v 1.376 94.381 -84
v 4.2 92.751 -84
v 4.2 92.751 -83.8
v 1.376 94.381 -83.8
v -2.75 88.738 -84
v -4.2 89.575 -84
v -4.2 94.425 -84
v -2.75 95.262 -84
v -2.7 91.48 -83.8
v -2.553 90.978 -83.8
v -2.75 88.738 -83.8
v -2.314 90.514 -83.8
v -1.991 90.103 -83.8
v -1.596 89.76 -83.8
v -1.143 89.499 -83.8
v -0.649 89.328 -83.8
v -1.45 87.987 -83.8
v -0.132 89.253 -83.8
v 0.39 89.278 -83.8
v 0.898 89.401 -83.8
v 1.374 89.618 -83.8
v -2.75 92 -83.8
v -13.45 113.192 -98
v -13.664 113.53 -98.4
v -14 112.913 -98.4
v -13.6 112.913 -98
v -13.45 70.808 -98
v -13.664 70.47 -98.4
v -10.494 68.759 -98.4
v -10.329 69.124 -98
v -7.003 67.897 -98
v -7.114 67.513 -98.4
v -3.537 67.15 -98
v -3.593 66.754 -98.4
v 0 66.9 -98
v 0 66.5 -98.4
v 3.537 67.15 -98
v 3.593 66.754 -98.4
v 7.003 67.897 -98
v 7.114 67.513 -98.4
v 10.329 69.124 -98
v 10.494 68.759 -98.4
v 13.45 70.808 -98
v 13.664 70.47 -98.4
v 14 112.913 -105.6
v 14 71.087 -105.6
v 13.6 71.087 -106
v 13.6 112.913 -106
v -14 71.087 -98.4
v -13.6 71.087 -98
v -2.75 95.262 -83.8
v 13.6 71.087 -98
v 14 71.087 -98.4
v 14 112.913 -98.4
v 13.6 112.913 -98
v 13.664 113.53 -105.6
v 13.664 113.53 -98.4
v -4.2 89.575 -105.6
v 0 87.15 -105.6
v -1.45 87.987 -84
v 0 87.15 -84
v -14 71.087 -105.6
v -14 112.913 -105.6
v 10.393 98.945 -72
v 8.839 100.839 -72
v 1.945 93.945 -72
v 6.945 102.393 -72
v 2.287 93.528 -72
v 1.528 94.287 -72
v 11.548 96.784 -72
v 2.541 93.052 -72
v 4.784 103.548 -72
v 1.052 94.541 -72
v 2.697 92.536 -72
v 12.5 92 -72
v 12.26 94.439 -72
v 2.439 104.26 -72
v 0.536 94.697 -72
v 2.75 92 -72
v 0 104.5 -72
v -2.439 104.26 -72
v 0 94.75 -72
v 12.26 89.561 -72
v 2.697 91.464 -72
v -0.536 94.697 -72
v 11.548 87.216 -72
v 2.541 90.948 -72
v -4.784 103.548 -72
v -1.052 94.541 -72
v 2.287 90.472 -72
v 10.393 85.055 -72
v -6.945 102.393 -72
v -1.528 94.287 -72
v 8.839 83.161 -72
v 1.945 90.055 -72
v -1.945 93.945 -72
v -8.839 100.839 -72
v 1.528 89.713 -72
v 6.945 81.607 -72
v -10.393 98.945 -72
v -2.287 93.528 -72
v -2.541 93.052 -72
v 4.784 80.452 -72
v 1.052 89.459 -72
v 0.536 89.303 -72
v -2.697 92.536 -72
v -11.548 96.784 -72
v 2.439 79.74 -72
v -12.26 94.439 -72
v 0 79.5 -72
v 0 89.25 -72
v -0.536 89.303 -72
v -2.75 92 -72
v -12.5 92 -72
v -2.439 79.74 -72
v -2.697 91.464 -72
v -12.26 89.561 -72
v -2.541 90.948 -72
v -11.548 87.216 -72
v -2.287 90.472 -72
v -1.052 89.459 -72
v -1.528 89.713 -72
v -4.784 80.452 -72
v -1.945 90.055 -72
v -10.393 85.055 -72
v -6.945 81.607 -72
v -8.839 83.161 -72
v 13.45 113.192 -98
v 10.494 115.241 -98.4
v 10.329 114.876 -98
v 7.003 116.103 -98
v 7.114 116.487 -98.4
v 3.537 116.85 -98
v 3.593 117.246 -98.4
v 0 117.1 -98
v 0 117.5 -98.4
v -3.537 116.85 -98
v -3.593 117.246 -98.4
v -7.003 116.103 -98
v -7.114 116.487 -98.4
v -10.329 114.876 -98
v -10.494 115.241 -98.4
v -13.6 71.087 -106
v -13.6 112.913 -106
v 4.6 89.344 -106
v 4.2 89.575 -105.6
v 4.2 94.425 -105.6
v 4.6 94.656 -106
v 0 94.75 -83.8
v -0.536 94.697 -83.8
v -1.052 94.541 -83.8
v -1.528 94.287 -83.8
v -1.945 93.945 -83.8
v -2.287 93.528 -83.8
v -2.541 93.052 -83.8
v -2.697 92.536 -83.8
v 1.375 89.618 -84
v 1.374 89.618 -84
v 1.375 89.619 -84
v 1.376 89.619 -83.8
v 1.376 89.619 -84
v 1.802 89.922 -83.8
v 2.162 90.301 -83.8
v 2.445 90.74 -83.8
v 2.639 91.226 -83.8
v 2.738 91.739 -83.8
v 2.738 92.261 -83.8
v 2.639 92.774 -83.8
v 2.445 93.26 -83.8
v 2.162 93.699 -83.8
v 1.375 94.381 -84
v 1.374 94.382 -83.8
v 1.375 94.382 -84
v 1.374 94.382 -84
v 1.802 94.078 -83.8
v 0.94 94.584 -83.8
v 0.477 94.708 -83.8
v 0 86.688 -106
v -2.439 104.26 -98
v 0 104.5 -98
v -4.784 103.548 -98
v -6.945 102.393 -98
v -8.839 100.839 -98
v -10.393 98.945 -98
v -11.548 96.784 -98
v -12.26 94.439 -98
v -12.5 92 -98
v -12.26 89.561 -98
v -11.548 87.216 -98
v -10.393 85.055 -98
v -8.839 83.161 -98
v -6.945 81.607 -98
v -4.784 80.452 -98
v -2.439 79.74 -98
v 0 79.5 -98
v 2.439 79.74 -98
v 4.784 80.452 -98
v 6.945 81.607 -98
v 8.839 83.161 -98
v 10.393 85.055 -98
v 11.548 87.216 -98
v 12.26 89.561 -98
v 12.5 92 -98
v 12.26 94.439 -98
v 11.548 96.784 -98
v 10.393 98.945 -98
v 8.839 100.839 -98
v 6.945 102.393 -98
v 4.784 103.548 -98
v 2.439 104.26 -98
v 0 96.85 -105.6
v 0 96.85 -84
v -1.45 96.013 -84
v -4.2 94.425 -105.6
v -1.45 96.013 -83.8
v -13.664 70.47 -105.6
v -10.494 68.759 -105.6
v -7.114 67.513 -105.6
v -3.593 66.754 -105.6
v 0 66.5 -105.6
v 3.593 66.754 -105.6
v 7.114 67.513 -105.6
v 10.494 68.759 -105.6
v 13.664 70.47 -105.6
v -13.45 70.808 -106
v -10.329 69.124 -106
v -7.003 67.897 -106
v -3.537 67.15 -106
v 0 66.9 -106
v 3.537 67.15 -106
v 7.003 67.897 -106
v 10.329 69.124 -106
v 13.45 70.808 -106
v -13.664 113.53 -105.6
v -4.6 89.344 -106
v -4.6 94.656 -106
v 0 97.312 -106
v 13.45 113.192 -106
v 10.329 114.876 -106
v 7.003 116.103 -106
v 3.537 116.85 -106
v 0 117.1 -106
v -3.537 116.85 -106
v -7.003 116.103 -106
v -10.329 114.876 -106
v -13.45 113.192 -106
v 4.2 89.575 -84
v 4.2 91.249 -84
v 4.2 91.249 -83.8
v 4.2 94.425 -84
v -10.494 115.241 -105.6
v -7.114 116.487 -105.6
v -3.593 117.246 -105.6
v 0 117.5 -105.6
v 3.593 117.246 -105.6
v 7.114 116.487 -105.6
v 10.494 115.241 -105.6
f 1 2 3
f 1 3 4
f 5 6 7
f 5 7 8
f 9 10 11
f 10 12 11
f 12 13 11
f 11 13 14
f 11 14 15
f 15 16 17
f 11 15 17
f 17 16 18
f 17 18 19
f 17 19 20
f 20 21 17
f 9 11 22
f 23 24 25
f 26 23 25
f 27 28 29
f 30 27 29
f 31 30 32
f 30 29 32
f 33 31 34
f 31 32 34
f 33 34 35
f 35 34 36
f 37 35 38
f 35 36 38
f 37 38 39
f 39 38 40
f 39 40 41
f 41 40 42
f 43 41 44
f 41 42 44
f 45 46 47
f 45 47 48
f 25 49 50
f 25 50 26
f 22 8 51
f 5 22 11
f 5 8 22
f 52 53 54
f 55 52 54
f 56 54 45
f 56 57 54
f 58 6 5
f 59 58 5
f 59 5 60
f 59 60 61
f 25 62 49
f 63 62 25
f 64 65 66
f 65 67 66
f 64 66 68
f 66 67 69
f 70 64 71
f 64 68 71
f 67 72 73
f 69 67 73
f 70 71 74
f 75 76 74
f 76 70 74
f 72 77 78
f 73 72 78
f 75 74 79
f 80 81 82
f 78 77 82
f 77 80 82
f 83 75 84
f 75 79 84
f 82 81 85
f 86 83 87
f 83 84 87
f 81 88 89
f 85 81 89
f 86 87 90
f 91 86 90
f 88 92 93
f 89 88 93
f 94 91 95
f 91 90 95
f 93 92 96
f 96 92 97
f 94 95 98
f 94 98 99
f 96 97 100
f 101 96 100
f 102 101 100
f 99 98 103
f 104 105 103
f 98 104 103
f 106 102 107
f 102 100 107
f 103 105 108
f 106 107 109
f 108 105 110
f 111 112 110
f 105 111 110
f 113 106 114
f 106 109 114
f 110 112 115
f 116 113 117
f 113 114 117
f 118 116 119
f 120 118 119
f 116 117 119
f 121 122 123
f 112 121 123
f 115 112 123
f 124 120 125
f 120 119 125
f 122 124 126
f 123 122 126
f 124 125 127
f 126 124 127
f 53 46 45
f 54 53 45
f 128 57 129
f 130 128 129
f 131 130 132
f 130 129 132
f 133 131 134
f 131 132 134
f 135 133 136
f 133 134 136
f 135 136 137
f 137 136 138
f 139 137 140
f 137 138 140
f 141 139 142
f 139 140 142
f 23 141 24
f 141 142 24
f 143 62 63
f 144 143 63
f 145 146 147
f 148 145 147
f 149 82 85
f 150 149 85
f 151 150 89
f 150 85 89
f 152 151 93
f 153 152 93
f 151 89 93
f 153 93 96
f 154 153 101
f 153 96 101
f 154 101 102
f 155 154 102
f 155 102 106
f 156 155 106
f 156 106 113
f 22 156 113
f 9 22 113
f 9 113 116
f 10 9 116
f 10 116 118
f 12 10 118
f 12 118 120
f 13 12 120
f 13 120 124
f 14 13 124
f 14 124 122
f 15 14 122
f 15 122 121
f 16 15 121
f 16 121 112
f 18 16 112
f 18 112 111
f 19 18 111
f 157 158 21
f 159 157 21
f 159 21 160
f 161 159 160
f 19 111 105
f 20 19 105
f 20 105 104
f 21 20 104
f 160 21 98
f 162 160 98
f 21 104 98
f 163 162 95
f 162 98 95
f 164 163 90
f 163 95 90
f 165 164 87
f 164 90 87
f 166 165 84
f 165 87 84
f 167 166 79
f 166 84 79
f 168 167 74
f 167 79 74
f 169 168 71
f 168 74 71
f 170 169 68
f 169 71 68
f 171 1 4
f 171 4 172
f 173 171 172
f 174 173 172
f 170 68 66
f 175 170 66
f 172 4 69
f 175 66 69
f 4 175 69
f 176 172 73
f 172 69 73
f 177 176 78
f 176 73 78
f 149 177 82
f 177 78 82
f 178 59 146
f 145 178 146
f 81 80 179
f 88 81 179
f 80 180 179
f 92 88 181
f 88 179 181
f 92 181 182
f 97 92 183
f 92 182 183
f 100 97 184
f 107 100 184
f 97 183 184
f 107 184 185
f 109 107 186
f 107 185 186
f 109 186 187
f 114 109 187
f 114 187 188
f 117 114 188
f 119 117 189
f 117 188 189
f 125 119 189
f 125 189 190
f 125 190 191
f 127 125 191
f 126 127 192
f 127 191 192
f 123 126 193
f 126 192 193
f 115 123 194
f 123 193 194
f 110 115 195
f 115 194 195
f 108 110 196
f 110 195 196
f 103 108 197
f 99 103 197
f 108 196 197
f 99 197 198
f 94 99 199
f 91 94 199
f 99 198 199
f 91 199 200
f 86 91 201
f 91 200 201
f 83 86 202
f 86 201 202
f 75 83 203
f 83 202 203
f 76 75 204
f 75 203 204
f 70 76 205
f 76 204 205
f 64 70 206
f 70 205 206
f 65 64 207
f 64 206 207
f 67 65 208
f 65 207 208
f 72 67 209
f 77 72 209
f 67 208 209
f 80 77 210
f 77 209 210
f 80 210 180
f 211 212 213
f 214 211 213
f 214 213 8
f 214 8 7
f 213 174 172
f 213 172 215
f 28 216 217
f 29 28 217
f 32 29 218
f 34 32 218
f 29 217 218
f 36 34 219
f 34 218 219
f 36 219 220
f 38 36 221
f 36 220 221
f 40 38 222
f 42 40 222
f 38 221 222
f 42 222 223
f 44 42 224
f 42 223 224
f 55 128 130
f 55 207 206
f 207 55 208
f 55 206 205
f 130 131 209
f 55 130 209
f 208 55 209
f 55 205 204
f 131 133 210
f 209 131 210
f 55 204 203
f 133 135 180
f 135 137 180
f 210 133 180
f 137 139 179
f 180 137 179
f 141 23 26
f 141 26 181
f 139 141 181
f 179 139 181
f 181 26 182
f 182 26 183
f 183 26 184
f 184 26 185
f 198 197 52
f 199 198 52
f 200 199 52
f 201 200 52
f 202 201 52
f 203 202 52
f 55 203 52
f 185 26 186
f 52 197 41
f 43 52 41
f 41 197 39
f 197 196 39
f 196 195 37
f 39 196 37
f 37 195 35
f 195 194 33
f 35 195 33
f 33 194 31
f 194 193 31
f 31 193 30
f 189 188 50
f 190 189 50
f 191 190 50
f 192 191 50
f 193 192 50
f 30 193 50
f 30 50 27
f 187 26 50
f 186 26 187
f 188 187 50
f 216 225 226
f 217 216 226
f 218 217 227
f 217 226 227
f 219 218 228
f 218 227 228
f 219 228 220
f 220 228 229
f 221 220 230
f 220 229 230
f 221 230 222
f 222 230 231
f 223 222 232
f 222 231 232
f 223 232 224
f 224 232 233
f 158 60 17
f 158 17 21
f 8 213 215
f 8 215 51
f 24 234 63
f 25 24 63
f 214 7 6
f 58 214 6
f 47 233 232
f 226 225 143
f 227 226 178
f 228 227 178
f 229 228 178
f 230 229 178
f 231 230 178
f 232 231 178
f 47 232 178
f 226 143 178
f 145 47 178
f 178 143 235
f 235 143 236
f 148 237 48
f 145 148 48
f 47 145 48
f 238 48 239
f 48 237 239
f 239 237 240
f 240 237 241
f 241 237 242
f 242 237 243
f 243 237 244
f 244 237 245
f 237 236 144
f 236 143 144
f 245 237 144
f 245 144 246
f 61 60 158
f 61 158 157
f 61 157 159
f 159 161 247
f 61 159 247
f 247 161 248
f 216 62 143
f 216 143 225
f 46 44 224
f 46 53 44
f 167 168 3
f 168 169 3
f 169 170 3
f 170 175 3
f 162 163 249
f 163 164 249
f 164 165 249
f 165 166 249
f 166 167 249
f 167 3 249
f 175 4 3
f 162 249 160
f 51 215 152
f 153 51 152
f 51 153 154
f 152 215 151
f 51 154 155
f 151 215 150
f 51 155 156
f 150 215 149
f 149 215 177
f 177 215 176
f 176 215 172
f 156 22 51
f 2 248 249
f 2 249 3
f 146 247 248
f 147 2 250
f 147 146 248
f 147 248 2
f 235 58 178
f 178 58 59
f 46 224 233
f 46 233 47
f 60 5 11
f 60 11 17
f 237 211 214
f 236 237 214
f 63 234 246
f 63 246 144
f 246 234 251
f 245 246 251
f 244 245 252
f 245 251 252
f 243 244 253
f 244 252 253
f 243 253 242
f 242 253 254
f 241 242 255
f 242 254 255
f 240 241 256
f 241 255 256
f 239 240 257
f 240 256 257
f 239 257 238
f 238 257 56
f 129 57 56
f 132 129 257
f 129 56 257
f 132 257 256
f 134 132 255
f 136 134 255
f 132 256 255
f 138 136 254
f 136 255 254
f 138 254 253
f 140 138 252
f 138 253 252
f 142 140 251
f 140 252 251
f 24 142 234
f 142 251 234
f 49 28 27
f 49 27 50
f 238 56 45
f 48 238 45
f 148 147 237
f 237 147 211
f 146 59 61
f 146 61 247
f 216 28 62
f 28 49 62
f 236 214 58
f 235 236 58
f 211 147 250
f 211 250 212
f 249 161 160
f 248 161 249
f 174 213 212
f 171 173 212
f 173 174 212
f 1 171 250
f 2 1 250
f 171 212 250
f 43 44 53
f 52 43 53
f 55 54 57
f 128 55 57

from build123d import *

# Parameters (mm, degrees)
SKETCH151_W     = 65
SKETCH151_H     = 65
SKETCH151_W_2   = 53.065996
SKETCH151_H_2   = 28
POCKET099_DEPTH = 34.001
POCKET100_DEPTH = 22.001
POCKET_DEPTH    = 0.2
CHAMFER_SIZE    = 0.4


with BuildPart() as part:
    # Sketch103 → Revolution002 (revolve)
    with BuildSketch(Plane.YZ):
        Polygon((2.75, 0), (12.5, 0), (12.5, -26), (25.5, -26), (25.5, -34), (2.75, -34), align=None)
    revolve(axis=Axis((0, 0, 0), (0, 0, 1)))

    # Sketch151 (on Face5 of Revolution002) → Pocket099 (cut, through all)
    with BuildSketch(Plane.YX.offset(34)):
        Rectangle(SKETCH151_W, SKETCH151_H)
        Rectangle(SKETCH151_W_2, SKETCH151_H_2, mode=Mode.SUBTRACT)
    extrude(amount=-POCKET099_DEPTH, mode=Mode.SUBTRACT)

    # Sketch142 → Pocket100 (cut, through all)
    with BuildSketch(Plane.XY.offset(-12)):
        Polygon((4.2, 2.424871), (0, 4.849742), (-4.2, 2.424871), (-4.2, -2.424871), (0, -4.849742), (4.2, -2.424871), align=None)
    extrude(amount=-POCKET100_DEPTH, mode=Mode.SUBTRACT)

    # Sketch (on Face4 of Pocket100) → Pocket (cut)
    with BuildSketch(Plane.YX.offset(12)):
        Polygon((0.750555, 4.2), (4.012584, -1.45), (3.262029, -2.75), (-3.262029, -2.75), (-4.012584, -1.45), (-0.750555, 4.2), align=None)
    extrude(amount=-POCKET_DEPTH, mode=Mode.SUBTRACT)

    # Chamfer
    chamfer_edges = [part.edges().sort_by_distance(p)[0] for p in [
        (-7.306329, 24.430873, -34),
        (-14, 0, -34),
        (7.306329, 24.430873, -34),
        (0, -25.5, -34),
        (14, 0, -34),
        (2.1, 3.637307, -34),
        (4.2, 0, -34),
        (2.1, -3.637307, -34),
        (-2.1, -3.637307, -34),
        (-4.2, 0, -34),
        (-2.1, 3.637307, -34),
        (0, -25.5, -26),
        (14, 0, -26),
        (7.306329, 24.430873, -26),
        (-7.306329, 24.430873, -26),
        (-14, 0, -26),
        (14, -21.313141, -30),
        (14, 21.313141, -30),
        (-14, 21.313141, -30),
        (-14, -21.313141, -30),
    ]]
    chamfer(chamfer_edges, length=CHAMFER_SIZE)


with BuildPart() as part_1:
    # Body022019 placement: moved
    add(part.part.moved(Location((0, 92, -72))))


solid = part_1.part
